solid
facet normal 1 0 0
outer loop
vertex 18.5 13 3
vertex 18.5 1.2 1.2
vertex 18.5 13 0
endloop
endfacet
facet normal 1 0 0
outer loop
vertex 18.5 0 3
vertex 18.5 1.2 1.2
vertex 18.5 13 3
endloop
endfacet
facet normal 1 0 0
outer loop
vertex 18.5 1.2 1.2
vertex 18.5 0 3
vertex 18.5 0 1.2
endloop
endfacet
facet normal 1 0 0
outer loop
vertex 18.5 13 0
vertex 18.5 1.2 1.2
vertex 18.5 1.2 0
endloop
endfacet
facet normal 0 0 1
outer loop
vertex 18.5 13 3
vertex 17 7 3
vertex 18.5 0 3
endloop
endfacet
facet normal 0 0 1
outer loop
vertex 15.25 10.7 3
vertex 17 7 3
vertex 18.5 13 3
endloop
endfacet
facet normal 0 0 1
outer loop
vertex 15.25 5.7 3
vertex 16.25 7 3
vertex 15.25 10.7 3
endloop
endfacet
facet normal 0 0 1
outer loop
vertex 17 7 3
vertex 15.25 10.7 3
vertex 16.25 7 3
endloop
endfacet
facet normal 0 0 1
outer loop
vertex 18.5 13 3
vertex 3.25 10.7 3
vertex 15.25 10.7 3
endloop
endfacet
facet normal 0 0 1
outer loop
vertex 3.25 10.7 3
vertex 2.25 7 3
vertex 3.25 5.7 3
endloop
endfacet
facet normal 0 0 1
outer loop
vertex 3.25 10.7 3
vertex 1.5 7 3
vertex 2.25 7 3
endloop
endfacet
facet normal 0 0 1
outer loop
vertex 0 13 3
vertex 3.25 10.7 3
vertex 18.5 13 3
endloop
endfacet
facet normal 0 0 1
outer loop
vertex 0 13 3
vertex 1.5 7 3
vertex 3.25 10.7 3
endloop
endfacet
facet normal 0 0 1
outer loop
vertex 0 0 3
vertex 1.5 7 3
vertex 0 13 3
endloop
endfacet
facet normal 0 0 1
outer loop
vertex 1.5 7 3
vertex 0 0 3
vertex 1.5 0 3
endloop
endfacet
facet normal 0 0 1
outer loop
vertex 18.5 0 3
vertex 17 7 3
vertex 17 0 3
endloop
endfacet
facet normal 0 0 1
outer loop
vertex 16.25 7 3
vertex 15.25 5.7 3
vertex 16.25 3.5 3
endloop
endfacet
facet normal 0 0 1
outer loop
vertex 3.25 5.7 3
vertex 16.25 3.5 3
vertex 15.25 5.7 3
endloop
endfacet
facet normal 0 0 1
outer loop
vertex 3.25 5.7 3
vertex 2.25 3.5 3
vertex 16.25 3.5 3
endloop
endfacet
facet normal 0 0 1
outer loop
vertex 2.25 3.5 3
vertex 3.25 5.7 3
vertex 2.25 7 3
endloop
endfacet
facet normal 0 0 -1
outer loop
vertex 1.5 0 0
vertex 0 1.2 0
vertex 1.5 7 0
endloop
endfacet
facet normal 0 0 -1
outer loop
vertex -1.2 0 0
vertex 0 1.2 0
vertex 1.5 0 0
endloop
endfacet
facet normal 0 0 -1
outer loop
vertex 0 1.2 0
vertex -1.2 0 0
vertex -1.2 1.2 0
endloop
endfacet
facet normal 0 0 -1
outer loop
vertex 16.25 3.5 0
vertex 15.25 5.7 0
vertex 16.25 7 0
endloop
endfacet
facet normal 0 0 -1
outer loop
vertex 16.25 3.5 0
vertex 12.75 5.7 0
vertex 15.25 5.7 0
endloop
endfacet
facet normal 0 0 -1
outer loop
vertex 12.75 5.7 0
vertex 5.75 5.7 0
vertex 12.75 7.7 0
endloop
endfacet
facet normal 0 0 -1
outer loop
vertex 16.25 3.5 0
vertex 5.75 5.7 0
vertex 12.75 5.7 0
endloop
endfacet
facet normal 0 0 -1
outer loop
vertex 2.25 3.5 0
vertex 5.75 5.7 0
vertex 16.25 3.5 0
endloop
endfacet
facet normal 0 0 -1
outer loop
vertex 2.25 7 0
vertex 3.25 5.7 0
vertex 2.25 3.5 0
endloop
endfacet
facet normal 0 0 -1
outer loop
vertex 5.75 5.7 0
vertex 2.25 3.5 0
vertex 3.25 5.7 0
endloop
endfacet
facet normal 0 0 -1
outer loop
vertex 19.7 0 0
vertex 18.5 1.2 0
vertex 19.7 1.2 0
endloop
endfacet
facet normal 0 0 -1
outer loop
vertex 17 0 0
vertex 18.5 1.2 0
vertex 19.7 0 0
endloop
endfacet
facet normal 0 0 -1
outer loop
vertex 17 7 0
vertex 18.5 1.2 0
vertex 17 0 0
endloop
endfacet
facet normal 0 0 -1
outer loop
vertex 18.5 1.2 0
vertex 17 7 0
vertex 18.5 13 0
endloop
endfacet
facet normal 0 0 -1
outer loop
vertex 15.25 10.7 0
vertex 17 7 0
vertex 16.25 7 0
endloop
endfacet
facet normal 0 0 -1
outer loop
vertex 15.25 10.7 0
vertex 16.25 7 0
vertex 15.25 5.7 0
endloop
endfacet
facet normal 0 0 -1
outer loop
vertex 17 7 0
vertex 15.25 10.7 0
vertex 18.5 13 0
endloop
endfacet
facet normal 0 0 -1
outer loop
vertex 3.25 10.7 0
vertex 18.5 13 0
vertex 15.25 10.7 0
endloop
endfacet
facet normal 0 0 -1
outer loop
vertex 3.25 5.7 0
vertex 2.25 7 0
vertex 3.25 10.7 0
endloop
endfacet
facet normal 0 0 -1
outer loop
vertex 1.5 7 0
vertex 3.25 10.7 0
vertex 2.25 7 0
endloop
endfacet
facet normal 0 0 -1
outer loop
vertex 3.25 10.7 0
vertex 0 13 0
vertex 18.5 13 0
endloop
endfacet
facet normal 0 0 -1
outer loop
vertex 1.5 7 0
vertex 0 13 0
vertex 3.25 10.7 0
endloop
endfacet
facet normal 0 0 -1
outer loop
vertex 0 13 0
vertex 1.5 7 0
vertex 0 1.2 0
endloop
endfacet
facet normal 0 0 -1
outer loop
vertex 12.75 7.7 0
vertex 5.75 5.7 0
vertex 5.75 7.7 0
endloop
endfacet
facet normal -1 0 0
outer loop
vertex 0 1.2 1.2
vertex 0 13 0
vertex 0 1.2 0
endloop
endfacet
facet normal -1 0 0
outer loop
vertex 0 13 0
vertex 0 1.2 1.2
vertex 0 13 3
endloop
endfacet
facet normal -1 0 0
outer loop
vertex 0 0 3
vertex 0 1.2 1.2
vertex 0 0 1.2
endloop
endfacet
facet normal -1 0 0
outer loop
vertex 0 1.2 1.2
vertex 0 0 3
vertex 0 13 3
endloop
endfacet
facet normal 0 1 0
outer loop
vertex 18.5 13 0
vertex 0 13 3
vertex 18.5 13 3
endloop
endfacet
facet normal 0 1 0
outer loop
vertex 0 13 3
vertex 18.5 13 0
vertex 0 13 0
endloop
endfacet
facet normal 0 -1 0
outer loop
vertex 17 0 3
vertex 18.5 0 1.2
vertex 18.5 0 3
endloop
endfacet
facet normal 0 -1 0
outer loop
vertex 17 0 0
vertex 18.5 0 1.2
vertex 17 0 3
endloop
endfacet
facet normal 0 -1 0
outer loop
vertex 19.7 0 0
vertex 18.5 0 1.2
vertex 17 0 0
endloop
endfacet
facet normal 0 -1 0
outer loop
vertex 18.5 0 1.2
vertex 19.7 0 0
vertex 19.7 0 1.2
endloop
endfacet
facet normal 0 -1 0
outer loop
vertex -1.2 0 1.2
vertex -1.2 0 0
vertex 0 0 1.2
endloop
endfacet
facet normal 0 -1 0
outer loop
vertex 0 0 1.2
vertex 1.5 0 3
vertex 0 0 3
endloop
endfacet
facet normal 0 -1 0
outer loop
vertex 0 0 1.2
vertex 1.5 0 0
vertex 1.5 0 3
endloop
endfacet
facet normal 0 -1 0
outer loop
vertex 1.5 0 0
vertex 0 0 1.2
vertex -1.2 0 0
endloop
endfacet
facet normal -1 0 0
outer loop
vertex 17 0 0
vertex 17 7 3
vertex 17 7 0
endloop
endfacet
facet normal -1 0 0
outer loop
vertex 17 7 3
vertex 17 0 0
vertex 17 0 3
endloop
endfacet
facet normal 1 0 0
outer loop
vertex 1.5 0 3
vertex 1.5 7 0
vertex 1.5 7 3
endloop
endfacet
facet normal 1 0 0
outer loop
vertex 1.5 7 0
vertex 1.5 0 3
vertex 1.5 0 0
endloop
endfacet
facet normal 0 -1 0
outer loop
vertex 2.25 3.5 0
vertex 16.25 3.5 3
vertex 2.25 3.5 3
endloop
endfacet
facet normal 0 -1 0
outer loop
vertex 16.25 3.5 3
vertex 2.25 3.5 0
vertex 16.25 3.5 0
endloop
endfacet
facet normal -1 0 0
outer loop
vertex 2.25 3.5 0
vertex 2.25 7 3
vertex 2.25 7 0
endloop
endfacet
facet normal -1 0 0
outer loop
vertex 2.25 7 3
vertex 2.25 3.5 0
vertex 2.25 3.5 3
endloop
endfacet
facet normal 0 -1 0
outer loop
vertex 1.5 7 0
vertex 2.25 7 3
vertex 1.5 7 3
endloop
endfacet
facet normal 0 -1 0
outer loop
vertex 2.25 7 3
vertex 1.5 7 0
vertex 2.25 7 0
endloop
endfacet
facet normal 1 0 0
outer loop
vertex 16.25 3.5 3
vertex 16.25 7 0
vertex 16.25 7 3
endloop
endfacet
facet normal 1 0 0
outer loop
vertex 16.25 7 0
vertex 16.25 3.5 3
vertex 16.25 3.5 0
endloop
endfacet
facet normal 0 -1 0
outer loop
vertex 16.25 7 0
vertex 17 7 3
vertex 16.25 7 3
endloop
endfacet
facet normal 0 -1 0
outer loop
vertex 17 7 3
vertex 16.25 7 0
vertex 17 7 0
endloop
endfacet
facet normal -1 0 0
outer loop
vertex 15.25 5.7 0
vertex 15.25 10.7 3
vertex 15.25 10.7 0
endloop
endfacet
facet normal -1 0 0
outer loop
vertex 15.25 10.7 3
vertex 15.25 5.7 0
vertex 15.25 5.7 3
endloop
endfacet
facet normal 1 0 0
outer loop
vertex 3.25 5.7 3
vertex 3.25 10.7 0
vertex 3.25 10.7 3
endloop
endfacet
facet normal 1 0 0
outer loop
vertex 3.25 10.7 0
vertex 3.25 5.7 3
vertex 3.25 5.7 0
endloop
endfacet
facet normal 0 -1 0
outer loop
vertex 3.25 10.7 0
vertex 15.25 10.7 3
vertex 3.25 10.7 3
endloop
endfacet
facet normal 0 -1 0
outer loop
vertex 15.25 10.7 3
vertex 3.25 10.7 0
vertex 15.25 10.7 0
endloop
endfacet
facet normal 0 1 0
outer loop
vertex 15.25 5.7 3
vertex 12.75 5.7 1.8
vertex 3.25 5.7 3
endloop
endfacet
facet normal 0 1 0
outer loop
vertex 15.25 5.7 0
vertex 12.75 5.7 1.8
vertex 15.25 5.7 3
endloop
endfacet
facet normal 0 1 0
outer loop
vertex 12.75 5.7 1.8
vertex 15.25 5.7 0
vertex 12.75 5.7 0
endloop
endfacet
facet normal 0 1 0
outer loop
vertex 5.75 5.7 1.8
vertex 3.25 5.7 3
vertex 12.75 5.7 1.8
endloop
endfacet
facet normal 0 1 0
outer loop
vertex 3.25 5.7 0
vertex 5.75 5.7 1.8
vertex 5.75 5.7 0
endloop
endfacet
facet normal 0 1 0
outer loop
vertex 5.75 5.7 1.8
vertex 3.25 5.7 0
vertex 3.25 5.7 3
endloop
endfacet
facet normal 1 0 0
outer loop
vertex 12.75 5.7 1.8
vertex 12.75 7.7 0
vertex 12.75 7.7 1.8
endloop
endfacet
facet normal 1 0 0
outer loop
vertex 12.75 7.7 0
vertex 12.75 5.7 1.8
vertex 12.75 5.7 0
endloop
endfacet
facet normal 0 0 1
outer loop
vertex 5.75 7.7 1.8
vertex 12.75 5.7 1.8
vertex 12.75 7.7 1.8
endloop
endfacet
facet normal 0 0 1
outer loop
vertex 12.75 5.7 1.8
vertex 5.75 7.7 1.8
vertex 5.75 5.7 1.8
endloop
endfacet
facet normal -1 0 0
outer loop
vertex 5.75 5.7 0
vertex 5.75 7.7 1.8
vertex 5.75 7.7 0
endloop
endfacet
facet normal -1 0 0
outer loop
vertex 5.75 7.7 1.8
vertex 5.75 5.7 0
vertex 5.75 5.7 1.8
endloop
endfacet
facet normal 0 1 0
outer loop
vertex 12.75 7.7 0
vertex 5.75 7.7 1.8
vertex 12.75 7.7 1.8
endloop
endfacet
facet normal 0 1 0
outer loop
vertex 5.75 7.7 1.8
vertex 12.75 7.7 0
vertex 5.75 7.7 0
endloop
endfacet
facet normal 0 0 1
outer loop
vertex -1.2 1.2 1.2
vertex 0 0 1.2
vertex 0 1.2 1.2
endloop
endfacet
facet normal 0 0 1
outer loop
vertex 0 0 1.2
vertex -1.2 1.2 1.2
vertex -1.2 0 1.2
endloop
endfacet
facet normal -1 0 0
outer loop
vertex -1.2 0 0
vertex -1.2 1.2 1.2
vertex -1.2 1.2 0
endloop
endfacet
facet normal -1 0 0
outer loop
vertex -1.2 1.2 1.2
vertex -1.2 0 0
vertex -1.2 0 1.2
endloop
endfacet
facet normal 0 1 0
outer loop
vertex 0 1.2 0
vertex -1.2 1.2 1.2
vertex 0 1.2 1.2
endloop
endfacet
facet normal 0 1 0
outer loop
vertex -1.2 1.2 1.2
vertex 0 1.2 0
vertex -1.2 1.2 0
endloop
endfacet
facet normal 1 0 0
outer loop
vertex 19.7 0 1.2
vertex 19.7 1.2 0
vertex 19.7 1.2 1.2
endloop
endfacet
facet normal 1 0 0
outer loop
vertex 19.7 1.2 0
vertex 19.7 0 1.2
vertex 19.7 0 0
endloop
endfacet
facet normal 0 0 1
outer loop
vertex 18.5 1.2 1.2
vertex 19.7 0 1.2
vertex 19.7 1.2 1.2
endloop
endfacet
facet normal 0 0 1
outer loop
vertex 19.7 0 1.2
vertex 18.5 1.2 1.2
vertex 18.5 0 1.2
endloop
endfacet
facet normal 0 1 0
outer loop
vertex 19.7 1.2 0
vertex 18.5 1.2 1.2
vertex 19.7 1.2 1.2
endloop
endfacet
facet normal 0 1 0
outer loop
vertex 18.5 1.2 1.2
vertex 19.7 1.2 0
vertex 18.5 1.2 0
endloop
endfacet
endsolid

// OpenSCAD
width = 18.5;
depth= 13; // 6.8;
height = 3.0;
tooth_size = 1.2;

finger_width = height / 2;
finger_length = 3.5;

slot_offset = 2.3; //
slot_thickness = 5; //
slot_width = 12;
slot_tab_thickness = 1.8; // mm
slot_tab_width = 7; // mm
slot_tab_depth = 2;

union() {
  difference() {
    cube([width, depth, height]);
    translate([finger_width, 0, 0]) {
      cube([width - 2 * finger_width, finger_length, height]);
    }

    // bend slots
    translate([finger_width, 0, 0]) {
      cube([finger_width / 2, 2 * finger_length, height]);
    }
    translate([width - 1.5 * finger_width, 0, 0]) {
      cube([finger_width / 2 , 2 * finger_length, height]);
    }

    // slot
    translate([(width - slot_width) / 2, depth - slot_offset - slot_thickness, 0]) {
      cube([slot_width, slot_thickness, height]);
    }
  }

  // slot tab
  translate([(width - slot_tab_width) / 2, depth - slot_offset - slot_thickness,0]) {
    cube([slot_tab_width, slot_tab_depth, slot_tab_thickness]);
  }

  // side teeth
  translate([-tooth_size, 0, 0]) {
    cube([tooth_size, tooth_size, tooth_size]);
  }
  translate([width, 0, 0]) {
    cube([tooth_size, tooth_size, tooth_size]);
  }
}
